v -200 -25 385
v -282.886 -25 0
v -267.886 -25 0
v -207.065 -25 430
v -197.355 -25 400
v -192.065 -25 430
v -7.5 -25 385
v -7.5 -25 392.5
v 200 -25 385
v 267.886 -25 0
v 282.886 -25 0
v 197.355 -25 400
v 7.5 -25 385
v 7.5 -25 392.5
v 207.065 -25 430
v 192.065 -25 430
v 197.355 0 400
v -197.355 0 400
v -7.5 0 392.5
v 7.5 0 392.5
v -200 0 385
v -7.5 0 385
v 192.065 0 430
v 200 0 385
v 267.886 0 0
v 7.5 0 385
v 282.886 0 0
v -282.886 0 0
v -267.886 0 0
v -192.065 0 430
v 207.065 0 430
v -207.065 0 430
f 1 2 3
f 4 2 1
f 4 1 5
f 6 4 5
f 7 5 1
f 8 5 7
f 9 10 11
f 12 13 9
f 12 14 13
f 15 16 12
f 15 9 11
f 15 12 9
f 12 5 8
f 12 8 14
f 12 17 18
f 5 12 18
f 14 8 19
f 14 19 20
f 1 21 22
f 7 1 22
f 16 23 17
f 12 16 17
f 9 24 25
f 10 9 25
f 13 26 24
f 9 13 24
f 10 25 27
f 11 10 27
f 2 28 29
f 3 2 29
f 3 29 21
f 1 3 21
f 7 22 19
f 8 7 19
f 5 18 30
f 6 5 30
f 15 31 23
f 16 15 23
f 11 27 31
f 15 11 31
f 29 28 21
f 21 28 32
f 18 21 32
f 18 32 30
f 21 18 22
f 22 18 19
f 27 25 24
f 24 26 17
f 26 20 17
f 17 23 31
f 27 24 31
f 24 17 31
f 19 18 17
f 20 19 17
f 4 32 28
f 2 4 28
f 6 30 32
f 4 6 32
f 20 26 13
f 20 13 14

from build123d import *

# Parameters (mm, degrees)
F1_DEPTH = 25
F2_W     = 15
F2_H     = 7.5
F3_DEPTH = 25


with BuildPart() as f1:
    # F0 (on Front) → F1 (new body)
    with BuildSketch(Plane.XZ):
        Polygon((0, 400), (0, 385), (200, 385), (267.885888, 0), (282.885888, 0), (207.065286, 430), (192.065286, 430), (197.355095, 400), align=None)
        Polygon((-207.065286, 430), (-282.885888, 0), (-267.885888, 0), (-200, 385), (0, 385), (0, 400), (-197.355095, 400), (-192.065286, 430), align=None)
    extrude(amount=F1_DEPTH)

    # F2 (on face) → F3 (cut, through all)
    with BuildSketch(Plane.XZ.offset(25)):
        with Locations((0, 388.75)):
            Rectangle(F2_W, F2_H)
    extrude(amount=-F3_DEPTH, mode=Mode.SUBTRACT)


solid = f1.part
